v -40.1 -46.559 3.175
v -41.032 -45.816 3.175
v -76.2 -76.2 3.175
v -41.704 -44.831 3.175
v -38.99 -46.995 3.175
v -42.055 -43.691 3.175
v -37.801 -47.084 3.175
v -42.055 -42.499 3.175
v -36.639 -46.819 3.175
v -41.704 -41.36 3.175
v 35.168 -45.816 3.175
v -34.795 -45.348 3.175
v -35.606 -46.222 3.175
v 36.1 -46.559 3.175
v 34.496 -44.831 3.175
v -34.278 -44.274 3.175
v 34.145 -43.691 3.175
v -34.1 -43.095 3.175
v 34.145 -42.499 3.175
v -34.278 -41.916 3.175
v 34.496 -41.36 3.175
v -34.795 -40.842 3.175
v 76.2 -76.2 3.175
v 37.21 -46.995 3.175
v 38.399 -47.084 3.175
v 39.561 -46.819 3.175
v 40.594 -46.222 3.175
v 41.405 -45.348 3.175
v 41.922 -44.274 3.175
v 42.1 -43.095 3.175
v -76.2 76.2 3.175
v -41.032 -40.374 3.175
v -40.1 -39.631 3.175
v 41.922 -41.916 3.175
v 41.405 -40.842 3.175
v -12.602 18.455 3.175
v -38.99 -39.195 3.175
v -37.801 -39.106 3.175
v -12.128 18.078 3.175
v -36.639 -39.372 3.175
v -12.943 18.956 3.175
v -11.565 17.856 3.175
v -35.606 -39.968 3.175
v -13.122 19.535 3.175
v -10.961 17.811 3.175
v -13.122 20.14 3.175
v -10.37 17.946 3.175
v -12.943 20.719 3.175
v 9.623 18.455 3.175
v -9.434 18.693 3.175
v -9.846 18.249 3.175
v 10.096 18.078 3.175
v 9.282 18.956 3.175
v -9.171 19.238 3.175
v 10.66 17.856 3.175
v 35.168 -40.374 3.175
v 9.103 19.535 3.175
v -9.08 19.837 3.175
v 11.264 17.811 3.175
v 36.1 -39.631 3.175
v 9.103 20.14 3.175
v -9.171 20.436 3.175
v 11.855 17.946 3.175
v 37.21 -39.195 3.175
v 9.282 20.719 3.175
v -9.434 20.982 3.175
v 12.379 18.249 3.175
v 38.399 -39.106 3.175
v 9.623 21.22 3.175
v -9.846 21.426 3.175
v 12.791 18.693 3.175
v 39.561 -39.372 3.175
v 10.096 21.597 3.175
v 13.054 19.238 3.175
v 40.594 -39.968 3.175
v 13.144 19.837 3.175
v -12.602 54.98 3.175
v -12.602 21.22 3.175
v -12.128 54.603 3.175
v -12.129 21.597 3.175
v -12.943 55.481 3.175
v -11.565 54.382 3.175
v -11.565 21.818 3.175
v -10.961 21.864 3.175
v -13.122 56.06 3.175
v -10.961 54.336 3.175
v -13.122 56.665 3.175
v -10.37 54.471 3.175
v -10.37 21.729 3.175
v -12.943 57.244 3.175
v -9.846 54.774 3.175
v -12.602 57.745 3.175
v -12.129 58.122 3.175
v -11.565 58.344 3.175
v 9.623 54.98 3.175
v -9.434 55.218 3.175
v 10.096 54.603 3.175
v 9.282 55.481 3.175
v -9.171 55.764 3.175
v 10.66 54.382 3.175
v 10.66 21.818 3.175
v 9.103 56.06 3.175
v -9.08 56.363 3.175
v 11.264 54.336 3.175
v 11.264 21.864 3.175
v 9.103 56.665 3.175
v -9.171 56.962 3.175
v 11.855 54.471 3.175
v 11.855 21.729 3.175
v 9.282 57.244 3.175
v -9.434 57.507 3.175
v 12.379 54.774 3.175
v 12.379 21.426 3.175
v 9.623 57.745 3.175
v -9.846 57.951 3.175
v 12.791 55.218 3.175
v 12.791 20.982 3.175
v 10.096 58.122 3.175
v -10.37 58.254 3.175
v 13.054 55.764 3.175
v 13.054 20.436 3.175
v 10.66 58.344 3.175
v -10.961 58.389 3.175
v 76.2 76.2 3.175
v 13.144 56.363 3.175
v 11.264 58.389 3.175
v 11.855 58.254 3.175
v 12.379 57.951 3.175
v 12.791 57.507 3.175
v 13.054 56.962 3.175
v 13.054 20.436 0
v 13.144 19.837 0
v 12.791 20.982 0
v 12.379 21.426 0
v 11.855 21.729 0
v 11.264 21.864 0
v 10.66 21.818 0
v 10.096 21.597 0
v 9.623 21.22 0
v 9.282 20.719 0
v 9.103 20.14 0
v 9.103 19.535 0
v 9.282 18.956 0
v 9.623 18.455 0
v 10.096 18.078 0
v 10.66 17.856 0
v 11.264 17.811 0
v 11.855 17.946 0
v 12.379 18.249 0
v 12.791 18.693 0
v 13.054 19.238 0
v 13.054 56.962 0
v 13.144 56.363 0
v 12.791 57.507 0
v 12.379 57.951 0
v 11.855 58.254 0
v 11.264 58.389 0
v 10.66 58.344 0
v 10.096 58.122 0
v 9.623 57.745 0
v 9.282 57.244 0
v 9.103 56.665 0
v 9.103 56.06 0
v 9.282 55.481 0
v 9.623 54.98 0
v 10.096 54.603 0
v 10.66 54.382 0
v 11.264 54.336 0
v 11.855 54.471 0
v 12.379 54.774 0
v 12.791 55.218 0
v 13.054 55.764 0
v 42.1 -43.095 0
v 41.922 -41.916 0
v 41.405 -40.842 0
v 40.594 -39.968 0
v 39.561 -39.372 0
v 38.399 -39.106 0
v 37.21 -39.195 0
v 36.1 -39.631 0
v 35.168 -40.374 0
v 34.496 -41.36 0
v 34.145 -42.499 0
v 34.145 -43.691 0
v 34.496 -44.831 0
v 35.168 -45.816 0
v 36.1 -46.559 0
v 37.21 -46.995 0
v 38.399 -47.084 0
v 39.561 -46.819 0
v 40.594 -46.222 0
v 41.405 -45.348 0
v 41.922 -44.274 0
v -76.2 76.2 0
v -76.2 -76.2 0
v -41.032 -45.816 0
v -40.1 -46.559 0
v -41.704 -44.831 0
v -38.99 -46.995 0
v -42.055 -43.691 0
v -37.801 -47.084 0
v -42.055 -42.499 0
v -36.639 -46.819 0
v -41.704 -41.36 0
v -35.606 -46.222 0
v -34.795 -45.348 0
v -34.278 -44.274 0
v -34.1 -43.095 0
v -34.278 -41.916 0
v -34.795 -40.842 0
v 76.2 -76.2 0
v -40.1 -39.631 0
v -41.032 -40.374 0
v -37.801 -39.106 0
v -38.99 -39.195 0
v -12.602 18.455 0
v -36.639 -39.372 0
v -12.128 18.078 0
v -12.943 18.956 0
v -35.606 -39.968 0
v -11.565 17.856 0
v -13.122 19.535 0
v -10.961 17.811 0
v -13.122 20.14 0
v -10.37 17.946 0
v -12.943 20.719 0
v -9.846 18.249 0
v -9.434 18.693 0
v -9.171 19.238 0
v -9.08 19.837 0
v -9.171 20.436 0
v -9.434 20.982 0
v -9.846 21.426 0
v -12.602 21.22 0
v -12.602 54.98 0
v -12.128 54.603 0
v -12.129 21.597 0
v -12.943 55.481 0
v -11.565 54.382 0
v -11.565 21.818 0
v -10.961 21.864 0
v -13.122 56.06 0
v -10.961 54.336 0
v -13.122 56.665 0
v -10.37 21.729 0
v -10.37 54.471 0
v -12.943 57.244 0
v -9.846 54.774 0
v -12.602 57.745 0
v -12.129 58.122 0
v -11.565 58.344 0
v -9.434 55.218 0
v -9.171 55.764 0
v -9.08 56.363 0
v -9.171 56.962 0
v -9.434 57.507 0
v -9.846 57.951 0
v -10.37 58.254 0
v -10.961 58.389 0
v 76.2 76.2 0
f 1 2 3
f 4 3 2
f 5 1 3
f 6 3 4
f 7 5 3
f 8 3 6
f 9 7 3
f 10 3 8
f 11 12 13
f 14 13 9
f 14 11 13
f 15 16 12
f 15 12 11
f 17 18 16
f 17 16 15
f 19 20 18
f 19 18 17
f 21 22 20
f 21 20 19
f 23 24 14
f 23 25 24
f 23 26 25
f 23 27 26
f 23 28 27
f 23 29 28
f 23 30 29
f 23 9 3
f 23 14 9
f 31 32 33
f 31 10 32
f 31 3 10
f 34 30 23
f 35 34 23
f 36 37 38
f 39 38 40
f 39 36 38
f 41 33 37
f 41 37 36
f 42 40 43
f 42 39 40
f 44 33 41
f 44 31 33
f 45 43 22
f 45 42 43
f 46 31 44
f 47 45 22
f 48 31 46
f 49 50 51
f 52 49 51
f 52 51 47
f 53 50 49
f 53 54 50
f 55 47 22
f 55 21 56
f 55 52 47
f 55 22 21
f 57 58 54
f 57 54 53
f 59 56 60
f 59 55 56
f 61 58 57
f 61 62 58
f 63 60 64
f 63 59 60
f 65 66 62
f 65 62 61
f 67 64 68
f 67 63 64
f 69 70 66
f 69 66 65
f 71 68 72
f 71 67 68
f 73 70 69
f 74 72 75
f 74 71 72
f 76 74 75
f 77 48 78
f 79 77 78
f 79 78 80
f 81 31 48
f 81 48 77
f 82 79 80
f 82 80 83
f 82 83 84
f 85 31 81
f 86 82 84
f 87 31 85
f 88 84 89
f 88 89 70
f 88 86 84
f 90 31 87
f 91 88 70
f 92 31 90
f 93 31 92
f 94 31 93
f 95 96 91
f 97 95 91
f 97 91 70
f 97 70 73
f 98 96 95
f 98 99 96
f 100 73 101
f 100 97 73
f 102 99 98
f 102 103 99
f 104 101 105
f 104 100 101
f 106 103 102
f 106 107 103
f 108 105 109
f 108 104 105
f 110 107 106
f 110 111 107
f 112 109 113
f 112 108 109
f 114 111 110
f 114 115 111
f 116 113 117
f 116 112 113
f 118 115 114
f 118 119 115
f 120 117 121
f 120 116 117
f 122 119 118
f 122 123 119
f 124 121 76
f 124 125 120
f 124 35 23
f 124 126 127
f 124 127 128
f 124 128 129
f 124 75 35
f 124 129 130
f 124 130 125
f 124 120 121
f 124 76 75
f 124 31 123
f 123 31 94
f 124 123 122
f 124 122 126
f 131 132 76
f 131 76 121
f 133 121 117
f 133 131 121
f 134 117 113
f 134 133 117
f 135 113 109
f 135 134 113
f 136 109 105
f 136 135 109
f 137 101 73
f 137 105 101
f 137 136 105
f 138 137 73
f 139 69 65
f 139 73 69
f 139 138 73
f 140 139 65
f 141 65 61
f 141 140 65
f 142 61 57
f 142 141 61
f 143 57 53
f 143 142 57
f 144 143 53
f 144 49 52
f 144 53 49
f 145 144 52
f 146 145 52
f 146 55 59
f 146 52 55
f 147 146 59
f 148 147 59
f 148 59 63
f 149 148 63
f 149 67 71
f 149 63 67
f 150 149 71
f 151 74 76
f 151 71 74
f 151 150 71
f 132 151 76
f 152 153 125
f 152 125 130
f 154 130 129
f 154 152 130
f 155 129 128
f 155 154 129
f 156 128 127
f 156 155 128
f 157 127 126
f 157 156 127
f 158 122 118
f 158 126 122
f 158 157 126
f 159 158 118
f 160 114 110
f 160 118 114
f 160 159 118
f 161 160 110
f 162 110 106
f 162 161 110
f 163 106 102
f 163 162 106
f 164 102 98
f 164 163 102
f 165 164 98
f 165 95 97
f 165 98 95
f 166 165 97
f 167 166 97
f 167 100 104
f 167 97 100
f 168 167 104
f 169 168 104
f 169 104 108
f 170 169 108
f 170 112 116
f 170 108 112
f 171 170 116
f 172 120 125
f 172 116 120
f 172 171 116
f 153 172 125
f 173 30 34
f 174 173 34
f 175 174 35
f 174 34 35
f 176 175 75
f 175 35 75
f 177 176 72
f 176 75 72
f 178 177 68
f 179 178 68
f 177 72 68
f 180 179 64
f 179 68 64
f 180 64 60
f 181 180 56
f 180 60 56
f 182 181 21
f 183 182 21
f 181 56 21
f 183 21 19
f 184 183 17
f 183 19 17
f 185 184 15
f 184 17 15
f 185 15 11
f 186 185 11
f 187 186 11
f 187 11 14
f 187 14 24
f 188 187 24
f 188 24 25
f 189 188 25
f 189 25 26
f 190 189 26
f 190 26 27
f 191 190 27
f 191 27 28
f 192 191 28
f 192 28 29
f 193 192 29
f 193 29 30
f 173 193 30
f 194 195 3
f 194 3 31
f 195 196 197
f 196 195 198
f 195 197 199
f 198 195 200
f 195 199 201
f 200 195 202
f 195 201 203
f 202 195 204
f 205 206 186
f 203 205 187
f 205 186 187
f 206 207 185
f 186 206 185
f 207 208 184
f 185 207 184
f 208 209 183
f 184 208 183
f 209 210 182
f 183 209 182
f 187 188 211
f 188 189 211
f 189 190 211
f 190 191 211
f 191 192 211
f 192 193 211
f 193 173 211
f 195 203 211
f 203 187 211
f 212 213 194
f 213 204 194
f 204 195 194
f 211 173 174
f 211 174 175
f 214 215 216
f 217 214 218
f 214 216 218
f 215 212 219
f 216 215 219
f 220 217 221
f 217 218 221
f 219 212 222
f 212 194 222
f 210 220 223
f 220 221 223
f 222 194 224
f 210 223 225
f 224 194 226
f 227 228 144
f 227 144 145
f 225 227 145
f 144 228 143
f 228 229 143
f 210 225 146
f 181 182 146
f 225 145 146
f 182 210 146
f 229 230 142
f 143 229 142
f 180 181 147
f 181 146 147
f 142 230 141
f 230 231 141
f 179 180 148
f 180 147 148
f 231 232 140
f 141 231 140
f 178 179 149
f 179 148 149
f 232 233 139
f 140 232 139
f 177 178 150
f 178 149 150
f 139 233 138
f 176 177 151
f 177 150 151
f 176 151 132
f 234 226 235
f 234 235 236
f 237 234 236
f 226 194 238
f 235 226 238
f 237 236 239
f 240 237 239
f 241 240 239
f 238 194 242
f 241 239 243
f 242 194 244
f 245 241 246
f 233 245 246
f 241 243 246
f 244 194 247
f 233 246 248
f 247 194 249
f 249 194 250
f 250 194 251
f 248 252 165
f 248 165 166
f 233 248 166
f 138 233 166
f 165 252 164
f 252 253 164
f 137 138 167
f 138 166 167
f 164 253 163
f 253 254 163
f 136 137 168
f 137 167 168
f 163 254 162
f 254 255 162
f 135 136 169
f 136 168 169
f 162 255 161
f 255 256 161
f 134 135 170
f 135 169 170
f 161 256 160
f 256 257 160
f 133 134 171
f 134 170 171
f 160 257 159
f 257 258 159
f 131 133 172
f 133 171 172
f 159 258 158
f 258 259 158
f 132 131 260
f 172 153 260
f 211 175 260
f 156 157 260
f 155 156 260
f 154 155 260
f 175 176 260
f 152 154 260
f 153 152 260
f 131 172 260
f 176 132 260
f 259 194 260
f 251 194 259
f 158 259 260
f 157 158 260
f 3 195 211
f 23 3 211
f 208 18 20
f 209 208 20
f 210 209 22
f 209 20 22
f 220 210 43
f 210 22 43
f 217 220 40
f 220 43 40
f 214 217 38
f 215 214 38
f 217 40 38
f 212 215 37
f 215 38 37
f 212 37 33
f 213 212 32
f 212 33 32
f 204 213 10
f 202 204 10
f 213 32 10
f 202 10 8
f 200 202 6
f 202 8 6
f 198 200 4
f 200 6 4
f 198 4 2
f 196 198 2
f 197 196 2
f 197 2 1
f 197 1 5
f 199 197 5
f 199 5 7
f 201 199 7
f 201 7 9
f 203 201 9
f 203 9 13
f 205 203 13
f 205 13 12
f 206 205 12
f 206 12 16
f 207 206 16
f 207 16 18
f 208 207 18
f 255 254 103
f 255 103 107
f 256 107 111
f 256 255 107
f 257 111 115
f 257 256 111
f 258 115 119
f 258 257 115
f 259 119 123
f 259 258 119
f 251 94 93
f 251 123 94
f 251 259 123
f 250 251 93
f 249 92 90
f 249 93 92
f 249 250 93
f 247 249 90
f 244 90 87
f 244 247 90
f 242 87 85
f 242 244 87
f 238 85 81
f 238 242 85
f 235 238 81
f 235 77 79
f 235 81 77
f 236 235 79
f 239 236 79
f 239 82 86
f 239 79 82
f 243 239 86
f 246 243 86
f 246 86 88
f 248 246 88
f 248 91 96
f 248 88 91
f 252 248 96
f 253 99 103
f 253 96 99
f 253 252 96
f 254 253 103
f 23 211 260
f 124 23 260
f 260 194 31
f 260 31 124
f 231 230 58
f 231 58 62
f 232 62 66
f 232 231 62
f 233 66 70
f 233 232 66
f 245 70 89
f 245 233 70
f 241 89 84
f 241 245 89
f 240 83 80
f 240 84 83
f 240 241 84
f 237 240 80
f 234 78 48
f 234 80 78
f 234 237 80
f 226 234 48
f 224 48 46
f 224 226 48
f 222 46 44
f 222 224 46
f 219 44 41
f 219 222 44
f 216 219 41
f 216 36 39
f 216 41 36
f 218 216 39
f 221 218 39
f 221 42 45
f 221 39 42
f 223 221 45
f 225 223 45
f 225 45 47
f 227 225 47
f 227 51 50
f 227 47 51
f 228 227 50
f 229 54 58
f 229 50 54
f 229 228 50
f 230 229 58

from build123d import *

# Parameters (mm, degrees)
SKETCH1_W               = 152.4
SKETCH1_H               = 152.4
BOSS_EXTRUDE1_DEPTH     = 3.175
CUT_EXTRUDE2_DEPTH      = 2.54
CUT_EXTRUDE2_DEPTH_BACK = 42.418
SKETCH2_R               = 2.032
SKETCH2_5_R             = 4
CUT_EXTRUDE3_DEPTH      = 42.418


with BuildPart() as part:
    # Sketch1 → Boss-Extrude1 (new body)
    with BuildSketch(Plane.XY):
        Rectangle(SKETCH1_W, SKETCH1_H)
    extrude(amount=BOSS_EXTRUDE1_DEPTH)

    # Sketch2 → Cut-Extrude2 (cut, two sides: drawn at the far end of the back side and taken through both)
    with BuildSketch(Plane.XY.offset(3.175).offset(-CUT_EXTRUDE2_DEPTH_BACK)):
        with Locations((-11.1125, 56.3626)):
            Circle(SKETCH2_R)
        with Locations((11.1125, 56.3626)):
            Circle(SKETCH2_R)
        with Locations((11.1125, 19.8374)):
            Circle(SKETCH2_R)
        with Locations((-11.1125, 19.8374)):
            Circle(SKETCH2_R)
    extrude(amount=CUT_EXTRUDE2_DEPTH + CUT_EXTRUDE2_DEPTH_BACK, mode=Mode.SUBTRACT)

    # Sketch2<5> → Cut-Extrude3 (cut)
    with BuildSketch(Plane.XY.offset(3.175)):
        with Locations((-38.1, -43.095115681)):
            Circle(SKETCH2_5_R)
        with Locations((38.1, -43.095115681)):
            Circle(SKETCH2_5_R)
    extrude(amount=-CUT_EXTRUDE3_DEPTH, mode=Mode.SUBTRACT)


solid = part.part
